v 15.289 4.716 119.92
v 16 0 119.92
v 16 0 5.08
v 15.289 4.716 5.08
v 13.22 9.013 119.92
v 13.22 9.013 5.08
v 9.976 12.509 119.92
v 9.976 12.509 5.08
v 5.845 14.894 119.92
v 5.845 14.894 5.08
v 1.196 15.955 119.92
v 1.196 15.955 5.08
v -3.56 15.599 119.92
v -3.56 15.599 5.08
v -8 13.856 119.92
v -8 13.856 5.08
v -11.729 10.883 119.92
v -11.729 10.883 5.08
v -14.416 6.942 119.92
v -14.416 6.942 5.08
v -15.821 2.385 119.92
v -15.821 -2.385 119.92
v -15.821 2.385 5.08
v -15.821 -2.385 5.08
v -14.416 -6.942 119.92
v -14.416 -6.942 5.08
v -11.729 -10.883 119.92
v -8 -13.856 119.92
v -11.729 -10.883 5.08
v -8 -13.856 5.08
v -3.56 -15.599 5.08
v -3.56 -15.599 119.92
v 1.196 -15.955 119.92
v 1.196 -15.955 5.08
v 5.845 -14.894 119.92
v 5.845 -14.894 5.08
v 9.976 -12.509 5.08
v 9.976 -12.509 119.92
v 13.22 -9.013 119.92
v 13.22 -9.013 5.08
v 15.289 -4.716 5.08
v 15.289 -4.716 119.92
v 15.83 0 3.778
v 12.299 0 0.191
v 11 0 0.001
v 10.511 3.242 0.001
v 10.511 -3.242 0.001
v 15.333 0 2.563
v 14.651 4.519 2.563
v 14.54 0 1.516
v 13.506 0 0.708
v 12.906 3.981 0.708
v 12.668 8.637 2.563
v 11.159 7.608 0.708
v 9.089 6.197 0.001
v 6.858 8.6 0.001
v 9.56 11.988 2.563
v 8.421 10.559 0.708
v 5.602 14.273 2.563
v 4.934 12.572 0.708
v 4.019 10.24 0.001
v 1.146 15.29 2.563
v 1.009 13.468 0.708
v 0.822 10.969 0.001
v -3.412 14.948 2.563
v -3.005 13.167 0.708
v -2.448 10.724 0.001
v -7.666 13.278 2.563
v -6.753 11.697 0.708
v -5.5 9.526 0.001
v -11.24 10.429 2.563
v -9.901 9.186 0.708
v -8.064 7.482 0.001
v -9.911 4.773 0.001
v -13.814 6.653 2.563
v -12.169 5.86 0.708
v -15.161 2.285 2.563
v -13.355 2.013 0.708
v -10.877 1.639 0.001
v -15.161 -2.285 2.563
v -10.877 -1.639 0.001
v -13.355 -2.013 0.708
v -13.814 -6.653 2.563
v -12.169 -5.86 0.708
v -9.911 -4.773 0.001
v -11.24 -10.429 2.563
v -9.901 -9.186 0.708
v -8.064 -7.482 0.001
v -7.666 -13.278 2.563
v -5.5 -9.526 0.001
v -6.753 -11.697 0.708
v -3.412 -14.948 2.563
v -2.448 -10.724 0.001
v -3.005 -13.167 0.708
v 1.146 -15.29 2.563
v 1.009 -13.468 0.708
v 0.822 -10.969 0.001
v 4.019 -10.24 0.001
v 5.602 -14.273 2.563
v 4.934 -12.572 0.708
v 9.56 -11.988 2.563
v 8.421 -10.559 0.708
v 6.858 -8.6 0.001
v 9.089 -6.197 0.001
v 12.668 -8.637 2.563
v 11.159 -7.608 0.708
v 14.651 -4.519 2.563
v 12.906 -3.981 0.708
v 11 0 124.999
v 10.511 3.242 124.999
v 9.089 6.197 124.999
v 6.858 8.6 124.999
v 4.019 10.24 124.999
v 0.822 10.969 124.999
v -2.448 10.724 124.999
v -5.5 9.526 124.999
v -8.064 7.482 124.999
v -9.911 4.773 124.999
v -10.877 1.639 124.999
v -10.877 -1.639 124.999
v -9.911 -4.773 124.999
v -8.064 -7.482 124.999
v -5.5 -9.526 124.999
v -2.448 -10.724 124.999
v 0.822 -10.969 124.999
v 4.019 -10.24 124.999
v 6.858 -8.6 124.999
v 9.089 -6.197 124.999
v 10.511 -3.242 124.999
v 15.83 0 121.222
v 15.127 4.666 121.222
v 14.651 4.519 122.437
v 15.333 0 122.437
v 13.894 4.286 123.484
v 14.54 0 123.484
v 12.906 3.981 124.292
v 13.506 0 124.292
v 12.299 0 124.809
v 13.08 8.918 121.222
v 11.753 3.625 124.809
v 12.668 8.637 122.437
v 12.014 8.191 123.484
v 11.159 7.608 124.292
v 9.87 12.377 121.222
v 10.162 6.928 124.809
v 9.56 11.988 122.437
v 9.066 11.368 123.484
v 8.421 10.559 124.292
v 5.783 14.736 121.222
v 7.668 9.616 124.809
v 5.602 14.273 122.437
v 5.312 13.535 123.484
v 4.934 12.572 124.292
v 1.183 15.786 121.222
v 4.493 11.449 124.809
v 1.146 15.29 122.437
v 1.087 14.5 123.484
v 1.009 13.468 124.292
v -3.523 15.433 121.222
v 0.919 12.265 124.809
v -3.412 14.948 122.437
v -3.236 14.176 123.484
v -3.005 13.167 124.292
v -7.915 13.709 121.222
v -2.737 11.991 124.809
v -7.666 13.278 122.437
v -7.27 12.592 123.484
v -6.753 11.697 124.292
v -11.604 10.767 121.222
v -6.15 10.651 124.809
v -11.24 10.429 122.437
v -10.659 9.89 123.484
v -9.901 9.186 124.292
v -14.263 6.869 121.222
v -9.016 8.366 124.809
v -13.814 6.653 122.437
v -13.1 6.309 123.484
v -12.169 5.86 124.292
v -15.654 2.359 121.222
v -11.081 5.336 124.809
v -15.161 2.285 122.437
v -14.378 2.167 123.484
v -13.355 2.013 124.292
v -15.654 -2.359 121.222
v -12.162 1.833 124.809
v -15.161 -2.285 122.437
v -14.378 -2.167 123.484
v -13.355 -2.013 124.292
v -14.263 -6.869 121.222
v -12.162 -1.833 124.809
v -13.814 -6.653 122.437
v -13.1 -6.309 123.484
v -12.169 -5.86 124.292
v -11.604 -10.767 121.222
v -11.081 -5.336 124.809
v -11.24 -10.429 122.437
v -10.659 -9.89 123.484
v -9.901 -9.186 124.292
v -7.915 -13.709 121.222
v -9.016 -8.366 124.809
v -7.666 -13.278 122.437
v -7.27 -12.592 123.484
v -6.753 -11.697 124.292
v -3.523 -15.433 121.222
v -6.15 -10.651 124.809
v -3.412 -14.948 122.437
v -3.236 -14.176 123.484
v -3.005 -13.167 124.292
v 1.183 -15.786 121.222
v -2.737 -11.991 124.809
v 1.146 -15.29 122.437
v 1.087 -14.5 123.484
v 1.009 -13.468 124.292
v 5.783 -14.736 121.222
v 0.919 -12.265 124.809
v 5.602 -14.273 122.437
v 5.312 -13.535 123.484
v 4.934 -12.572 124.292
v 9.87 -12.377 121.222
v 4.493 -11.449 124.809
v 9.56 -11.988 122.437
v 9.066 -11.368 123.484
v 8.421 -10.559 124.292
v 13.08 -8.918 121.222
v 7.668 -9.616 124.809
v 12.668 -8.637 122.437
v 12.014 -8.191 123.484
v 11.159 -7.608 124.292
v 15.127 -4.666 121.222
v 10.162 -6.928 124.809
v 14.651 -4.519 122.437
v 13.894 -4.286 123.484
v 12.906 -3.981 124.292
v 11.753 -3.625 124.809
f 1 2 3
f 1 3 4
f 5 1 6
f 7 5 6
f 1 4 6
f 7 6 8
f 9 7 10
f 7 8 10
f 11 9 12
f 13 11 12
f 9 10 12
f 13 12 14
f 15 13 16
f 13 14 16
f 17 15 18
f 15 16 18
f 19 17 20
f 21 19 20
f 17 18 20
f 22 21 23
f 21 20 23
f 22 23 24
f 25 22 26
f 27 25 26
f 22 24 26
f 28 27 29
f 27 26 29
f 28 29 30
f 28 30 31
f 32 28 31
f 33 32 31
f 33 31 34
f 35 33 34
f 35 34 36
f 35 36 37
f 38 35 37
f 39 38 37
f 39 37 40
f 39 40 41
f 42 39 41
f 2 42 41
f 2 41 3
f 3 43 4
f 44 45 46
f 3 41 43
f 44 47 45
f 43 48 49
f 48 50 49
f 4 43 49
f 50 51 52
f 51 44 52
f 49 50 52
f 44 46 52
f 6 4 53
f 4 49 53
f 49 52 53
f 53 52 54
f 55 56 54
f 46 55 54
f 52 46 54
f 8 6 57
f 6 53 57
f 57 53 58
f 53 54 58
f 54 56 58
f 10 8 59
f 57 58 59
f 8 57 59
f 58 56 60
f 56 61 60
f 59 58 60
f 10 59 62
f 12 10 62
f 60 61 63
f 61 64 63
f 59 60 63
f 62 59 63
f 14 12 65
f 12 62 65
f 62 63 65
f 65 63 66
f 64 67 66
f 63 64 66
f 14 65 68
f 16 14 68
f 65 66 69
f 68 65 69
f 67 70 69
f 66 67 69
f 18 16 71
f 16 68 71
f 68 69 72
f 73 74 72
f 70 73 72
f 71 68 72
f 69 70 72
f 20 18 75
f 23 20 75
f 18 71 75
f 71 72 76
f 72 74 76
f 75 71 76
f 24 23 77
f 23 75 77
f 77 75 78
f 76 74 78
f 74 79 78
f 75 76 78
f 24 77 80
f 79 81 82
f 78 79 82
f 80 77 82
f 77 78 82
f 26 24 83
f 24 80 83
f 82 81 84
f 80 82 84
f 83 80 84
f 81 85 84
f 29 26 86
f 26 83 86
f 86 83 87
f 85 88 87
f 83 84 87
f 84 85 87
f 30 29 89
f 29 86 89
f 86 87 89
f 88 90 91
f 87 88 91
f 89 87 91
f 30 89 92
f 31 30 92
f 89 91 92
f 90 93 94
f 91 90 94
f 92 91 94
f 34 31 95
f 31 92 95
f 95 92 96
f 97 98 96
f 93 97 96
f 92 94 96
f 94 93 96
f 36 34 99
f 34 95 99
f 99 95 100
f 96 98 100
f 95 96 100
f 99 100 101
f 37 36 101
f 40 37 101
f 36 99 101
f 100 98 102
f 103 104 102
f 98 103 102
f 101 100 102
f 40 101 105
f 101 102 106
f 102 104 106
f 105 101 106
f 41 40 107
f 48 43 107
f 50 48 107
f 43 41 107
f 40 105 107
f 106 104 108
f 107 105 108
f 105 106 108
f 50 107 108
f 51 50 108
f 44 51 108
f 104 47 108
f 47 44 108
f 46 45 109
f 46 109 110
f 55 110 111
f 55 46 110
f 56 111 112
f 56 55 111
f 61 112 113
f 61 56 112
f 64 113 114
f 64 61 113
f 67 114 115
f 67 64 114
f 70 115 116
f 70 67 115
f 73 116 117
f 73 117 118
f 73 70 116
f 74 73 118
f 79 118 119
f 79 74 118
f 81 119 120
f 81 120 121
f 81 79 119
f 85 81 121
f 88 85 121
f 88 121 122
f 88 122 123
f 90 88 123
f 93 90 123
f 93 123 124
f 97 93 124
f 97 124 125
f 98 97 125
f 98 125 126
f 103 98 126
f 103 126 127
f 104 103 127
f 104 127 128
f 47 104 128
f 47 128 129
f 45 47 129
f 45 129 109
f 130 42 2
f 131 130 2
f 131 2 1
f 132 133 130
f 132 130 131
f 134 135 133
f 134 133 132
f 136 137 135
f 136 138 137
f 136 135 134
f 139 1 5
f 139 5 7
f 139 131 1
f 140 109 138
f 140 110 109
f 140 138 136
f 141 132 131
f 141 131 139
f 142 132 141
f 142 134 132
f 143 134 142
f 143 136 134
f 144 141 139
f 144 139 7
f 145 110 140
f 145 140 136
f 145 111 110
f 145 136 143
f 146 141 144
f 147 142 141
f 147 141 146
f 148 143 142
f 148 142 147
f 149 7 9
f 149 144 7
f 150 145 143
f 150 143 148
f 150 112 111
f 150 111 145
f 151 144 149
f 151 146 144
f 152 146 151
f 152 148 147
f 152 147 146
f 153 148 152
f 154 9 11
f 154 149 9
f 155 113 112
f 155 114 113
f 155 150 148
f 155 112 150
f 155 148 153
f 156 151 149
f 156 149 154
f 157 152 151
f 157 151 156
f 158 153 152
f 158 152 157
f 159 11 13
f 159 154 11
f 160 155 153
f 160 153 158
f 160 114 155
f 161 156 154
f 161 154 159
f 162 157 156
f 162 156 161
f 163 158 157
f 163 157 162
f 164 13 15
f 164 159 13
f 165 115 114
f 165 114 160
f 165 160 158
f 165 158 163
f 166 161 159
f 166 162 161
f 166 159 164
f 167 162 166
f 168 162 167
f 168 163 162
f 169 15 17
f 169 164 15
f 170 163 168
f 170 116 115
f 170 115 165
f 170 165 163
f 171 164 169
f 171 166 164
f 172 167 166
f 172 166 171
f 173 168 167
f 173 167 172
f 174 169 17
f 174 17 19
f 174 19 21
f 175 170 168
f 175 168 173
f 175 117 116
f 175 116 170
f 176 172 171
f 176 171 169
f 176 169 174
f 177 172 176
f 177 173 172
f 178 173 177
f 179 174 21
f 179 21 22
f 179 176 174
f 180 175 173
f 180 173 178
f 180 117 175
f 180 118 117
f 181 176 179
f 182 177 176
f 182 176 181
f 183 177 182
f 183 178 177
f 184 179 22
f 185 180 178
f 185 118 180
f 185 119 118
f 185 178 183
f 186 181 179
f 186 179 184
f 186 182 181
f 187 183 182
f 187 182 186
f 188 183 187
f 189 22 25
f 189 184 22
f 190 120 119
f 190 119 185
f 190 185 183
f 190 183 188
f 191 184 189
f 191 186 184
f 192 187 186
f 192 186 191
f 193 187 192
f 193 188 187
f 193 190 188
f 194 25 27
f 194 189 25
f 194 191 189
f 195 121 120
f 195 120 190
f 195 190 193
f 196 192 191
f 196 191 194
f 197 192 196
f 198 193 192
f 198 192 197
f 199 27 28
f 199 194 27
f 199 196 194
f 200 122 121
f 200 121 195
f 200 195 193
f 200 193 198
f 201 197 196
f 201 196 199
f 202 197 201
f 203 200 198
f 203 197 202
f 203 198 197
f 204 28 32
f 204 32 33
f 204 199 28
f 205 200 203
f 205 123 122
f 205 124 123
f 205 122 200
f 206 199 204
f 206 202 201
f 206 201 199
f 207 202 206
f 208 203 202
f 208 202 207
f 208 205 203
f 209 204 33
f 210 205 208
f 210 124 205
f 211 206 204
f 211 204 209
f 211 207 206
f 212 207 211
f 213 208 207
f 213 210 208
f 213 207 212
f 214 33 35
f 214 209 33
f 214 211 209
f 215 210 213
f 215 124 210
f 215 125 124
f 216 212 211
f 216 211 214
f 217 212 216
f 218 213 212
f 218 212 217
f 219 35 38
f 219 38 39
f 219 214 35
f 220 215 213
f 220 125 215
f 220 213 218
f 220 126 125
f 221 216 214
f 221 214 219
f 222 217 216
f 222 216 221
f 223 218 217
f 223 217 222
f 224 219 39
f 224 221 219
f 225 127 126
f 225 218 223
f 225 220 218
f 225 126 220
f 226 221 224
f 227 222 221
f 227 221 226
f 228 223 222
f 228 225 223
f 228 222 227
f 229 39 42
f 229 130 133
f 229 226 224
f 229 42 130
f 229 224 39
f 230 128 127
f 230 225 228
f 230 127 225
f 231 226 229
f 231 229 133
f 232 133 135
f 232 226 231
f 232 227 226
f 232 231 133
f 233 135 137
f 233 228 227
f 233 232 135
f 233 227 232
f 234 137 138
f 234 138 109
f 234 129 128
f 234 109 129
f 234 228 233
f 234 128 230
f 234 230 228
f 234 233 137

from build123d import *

# Parameters (mm, degrees)
F0_R     = 16
F0_R_2   = 11
F1_DEPTH = 125


# Not quite as in the source:
# - a fillet or chamfer that OpenCascade refuses, or shapes differently, is made with other operations: its cross-section is extruded or revolved along the edge and cut away or added


with BuildPart() as f1:
    # F0 (on Top) → F1 (new body)
    with BuildSketch(Plane.XY):
        Circle(F0_R)
        Circle(F0_R_2, mode=Mode.SUBTRACT)
    extrude(amount=F1_DEPTH)

    # F2: fillet of radius 5.08 on 1 edges, made by hand

    # F2_s1 → F2_t2 (revolve, cut)
    with BuildSketch(Plane.XZ):
        with BuildLine():
            ThreePointArc((16, 119.92), (14.5121024484, 123.5121024484), (10.92, 125))
            Line((10.92, 125), (16, 125))
            Line((16, 125), (16, 119.92))
        make_face()
    revolve(axis=Axis((0, 0, 125), (0, 0, 1)), mode=Mode.SUBTRACT)

    # F3: fillet of radius 5.08 on 1 edges, made by hand

    # F3_s1 → F3_t2 (revolve, cut)
    with BuildSketch(Plane.XZ):
        with BuildLine():
            ThreePointArc((16, 5.08), (14.5121024484, 1.4878975516), (10.92, 0))
            Line((10.92, 0), (16, 0))
            Line((16, 0), (16, 5.08))
        make_face()
    revolve(axis=Axis((0, 0, 0), (0, 0, 1)), mode=Mode.SUBTRACT)


solid = f1.part
